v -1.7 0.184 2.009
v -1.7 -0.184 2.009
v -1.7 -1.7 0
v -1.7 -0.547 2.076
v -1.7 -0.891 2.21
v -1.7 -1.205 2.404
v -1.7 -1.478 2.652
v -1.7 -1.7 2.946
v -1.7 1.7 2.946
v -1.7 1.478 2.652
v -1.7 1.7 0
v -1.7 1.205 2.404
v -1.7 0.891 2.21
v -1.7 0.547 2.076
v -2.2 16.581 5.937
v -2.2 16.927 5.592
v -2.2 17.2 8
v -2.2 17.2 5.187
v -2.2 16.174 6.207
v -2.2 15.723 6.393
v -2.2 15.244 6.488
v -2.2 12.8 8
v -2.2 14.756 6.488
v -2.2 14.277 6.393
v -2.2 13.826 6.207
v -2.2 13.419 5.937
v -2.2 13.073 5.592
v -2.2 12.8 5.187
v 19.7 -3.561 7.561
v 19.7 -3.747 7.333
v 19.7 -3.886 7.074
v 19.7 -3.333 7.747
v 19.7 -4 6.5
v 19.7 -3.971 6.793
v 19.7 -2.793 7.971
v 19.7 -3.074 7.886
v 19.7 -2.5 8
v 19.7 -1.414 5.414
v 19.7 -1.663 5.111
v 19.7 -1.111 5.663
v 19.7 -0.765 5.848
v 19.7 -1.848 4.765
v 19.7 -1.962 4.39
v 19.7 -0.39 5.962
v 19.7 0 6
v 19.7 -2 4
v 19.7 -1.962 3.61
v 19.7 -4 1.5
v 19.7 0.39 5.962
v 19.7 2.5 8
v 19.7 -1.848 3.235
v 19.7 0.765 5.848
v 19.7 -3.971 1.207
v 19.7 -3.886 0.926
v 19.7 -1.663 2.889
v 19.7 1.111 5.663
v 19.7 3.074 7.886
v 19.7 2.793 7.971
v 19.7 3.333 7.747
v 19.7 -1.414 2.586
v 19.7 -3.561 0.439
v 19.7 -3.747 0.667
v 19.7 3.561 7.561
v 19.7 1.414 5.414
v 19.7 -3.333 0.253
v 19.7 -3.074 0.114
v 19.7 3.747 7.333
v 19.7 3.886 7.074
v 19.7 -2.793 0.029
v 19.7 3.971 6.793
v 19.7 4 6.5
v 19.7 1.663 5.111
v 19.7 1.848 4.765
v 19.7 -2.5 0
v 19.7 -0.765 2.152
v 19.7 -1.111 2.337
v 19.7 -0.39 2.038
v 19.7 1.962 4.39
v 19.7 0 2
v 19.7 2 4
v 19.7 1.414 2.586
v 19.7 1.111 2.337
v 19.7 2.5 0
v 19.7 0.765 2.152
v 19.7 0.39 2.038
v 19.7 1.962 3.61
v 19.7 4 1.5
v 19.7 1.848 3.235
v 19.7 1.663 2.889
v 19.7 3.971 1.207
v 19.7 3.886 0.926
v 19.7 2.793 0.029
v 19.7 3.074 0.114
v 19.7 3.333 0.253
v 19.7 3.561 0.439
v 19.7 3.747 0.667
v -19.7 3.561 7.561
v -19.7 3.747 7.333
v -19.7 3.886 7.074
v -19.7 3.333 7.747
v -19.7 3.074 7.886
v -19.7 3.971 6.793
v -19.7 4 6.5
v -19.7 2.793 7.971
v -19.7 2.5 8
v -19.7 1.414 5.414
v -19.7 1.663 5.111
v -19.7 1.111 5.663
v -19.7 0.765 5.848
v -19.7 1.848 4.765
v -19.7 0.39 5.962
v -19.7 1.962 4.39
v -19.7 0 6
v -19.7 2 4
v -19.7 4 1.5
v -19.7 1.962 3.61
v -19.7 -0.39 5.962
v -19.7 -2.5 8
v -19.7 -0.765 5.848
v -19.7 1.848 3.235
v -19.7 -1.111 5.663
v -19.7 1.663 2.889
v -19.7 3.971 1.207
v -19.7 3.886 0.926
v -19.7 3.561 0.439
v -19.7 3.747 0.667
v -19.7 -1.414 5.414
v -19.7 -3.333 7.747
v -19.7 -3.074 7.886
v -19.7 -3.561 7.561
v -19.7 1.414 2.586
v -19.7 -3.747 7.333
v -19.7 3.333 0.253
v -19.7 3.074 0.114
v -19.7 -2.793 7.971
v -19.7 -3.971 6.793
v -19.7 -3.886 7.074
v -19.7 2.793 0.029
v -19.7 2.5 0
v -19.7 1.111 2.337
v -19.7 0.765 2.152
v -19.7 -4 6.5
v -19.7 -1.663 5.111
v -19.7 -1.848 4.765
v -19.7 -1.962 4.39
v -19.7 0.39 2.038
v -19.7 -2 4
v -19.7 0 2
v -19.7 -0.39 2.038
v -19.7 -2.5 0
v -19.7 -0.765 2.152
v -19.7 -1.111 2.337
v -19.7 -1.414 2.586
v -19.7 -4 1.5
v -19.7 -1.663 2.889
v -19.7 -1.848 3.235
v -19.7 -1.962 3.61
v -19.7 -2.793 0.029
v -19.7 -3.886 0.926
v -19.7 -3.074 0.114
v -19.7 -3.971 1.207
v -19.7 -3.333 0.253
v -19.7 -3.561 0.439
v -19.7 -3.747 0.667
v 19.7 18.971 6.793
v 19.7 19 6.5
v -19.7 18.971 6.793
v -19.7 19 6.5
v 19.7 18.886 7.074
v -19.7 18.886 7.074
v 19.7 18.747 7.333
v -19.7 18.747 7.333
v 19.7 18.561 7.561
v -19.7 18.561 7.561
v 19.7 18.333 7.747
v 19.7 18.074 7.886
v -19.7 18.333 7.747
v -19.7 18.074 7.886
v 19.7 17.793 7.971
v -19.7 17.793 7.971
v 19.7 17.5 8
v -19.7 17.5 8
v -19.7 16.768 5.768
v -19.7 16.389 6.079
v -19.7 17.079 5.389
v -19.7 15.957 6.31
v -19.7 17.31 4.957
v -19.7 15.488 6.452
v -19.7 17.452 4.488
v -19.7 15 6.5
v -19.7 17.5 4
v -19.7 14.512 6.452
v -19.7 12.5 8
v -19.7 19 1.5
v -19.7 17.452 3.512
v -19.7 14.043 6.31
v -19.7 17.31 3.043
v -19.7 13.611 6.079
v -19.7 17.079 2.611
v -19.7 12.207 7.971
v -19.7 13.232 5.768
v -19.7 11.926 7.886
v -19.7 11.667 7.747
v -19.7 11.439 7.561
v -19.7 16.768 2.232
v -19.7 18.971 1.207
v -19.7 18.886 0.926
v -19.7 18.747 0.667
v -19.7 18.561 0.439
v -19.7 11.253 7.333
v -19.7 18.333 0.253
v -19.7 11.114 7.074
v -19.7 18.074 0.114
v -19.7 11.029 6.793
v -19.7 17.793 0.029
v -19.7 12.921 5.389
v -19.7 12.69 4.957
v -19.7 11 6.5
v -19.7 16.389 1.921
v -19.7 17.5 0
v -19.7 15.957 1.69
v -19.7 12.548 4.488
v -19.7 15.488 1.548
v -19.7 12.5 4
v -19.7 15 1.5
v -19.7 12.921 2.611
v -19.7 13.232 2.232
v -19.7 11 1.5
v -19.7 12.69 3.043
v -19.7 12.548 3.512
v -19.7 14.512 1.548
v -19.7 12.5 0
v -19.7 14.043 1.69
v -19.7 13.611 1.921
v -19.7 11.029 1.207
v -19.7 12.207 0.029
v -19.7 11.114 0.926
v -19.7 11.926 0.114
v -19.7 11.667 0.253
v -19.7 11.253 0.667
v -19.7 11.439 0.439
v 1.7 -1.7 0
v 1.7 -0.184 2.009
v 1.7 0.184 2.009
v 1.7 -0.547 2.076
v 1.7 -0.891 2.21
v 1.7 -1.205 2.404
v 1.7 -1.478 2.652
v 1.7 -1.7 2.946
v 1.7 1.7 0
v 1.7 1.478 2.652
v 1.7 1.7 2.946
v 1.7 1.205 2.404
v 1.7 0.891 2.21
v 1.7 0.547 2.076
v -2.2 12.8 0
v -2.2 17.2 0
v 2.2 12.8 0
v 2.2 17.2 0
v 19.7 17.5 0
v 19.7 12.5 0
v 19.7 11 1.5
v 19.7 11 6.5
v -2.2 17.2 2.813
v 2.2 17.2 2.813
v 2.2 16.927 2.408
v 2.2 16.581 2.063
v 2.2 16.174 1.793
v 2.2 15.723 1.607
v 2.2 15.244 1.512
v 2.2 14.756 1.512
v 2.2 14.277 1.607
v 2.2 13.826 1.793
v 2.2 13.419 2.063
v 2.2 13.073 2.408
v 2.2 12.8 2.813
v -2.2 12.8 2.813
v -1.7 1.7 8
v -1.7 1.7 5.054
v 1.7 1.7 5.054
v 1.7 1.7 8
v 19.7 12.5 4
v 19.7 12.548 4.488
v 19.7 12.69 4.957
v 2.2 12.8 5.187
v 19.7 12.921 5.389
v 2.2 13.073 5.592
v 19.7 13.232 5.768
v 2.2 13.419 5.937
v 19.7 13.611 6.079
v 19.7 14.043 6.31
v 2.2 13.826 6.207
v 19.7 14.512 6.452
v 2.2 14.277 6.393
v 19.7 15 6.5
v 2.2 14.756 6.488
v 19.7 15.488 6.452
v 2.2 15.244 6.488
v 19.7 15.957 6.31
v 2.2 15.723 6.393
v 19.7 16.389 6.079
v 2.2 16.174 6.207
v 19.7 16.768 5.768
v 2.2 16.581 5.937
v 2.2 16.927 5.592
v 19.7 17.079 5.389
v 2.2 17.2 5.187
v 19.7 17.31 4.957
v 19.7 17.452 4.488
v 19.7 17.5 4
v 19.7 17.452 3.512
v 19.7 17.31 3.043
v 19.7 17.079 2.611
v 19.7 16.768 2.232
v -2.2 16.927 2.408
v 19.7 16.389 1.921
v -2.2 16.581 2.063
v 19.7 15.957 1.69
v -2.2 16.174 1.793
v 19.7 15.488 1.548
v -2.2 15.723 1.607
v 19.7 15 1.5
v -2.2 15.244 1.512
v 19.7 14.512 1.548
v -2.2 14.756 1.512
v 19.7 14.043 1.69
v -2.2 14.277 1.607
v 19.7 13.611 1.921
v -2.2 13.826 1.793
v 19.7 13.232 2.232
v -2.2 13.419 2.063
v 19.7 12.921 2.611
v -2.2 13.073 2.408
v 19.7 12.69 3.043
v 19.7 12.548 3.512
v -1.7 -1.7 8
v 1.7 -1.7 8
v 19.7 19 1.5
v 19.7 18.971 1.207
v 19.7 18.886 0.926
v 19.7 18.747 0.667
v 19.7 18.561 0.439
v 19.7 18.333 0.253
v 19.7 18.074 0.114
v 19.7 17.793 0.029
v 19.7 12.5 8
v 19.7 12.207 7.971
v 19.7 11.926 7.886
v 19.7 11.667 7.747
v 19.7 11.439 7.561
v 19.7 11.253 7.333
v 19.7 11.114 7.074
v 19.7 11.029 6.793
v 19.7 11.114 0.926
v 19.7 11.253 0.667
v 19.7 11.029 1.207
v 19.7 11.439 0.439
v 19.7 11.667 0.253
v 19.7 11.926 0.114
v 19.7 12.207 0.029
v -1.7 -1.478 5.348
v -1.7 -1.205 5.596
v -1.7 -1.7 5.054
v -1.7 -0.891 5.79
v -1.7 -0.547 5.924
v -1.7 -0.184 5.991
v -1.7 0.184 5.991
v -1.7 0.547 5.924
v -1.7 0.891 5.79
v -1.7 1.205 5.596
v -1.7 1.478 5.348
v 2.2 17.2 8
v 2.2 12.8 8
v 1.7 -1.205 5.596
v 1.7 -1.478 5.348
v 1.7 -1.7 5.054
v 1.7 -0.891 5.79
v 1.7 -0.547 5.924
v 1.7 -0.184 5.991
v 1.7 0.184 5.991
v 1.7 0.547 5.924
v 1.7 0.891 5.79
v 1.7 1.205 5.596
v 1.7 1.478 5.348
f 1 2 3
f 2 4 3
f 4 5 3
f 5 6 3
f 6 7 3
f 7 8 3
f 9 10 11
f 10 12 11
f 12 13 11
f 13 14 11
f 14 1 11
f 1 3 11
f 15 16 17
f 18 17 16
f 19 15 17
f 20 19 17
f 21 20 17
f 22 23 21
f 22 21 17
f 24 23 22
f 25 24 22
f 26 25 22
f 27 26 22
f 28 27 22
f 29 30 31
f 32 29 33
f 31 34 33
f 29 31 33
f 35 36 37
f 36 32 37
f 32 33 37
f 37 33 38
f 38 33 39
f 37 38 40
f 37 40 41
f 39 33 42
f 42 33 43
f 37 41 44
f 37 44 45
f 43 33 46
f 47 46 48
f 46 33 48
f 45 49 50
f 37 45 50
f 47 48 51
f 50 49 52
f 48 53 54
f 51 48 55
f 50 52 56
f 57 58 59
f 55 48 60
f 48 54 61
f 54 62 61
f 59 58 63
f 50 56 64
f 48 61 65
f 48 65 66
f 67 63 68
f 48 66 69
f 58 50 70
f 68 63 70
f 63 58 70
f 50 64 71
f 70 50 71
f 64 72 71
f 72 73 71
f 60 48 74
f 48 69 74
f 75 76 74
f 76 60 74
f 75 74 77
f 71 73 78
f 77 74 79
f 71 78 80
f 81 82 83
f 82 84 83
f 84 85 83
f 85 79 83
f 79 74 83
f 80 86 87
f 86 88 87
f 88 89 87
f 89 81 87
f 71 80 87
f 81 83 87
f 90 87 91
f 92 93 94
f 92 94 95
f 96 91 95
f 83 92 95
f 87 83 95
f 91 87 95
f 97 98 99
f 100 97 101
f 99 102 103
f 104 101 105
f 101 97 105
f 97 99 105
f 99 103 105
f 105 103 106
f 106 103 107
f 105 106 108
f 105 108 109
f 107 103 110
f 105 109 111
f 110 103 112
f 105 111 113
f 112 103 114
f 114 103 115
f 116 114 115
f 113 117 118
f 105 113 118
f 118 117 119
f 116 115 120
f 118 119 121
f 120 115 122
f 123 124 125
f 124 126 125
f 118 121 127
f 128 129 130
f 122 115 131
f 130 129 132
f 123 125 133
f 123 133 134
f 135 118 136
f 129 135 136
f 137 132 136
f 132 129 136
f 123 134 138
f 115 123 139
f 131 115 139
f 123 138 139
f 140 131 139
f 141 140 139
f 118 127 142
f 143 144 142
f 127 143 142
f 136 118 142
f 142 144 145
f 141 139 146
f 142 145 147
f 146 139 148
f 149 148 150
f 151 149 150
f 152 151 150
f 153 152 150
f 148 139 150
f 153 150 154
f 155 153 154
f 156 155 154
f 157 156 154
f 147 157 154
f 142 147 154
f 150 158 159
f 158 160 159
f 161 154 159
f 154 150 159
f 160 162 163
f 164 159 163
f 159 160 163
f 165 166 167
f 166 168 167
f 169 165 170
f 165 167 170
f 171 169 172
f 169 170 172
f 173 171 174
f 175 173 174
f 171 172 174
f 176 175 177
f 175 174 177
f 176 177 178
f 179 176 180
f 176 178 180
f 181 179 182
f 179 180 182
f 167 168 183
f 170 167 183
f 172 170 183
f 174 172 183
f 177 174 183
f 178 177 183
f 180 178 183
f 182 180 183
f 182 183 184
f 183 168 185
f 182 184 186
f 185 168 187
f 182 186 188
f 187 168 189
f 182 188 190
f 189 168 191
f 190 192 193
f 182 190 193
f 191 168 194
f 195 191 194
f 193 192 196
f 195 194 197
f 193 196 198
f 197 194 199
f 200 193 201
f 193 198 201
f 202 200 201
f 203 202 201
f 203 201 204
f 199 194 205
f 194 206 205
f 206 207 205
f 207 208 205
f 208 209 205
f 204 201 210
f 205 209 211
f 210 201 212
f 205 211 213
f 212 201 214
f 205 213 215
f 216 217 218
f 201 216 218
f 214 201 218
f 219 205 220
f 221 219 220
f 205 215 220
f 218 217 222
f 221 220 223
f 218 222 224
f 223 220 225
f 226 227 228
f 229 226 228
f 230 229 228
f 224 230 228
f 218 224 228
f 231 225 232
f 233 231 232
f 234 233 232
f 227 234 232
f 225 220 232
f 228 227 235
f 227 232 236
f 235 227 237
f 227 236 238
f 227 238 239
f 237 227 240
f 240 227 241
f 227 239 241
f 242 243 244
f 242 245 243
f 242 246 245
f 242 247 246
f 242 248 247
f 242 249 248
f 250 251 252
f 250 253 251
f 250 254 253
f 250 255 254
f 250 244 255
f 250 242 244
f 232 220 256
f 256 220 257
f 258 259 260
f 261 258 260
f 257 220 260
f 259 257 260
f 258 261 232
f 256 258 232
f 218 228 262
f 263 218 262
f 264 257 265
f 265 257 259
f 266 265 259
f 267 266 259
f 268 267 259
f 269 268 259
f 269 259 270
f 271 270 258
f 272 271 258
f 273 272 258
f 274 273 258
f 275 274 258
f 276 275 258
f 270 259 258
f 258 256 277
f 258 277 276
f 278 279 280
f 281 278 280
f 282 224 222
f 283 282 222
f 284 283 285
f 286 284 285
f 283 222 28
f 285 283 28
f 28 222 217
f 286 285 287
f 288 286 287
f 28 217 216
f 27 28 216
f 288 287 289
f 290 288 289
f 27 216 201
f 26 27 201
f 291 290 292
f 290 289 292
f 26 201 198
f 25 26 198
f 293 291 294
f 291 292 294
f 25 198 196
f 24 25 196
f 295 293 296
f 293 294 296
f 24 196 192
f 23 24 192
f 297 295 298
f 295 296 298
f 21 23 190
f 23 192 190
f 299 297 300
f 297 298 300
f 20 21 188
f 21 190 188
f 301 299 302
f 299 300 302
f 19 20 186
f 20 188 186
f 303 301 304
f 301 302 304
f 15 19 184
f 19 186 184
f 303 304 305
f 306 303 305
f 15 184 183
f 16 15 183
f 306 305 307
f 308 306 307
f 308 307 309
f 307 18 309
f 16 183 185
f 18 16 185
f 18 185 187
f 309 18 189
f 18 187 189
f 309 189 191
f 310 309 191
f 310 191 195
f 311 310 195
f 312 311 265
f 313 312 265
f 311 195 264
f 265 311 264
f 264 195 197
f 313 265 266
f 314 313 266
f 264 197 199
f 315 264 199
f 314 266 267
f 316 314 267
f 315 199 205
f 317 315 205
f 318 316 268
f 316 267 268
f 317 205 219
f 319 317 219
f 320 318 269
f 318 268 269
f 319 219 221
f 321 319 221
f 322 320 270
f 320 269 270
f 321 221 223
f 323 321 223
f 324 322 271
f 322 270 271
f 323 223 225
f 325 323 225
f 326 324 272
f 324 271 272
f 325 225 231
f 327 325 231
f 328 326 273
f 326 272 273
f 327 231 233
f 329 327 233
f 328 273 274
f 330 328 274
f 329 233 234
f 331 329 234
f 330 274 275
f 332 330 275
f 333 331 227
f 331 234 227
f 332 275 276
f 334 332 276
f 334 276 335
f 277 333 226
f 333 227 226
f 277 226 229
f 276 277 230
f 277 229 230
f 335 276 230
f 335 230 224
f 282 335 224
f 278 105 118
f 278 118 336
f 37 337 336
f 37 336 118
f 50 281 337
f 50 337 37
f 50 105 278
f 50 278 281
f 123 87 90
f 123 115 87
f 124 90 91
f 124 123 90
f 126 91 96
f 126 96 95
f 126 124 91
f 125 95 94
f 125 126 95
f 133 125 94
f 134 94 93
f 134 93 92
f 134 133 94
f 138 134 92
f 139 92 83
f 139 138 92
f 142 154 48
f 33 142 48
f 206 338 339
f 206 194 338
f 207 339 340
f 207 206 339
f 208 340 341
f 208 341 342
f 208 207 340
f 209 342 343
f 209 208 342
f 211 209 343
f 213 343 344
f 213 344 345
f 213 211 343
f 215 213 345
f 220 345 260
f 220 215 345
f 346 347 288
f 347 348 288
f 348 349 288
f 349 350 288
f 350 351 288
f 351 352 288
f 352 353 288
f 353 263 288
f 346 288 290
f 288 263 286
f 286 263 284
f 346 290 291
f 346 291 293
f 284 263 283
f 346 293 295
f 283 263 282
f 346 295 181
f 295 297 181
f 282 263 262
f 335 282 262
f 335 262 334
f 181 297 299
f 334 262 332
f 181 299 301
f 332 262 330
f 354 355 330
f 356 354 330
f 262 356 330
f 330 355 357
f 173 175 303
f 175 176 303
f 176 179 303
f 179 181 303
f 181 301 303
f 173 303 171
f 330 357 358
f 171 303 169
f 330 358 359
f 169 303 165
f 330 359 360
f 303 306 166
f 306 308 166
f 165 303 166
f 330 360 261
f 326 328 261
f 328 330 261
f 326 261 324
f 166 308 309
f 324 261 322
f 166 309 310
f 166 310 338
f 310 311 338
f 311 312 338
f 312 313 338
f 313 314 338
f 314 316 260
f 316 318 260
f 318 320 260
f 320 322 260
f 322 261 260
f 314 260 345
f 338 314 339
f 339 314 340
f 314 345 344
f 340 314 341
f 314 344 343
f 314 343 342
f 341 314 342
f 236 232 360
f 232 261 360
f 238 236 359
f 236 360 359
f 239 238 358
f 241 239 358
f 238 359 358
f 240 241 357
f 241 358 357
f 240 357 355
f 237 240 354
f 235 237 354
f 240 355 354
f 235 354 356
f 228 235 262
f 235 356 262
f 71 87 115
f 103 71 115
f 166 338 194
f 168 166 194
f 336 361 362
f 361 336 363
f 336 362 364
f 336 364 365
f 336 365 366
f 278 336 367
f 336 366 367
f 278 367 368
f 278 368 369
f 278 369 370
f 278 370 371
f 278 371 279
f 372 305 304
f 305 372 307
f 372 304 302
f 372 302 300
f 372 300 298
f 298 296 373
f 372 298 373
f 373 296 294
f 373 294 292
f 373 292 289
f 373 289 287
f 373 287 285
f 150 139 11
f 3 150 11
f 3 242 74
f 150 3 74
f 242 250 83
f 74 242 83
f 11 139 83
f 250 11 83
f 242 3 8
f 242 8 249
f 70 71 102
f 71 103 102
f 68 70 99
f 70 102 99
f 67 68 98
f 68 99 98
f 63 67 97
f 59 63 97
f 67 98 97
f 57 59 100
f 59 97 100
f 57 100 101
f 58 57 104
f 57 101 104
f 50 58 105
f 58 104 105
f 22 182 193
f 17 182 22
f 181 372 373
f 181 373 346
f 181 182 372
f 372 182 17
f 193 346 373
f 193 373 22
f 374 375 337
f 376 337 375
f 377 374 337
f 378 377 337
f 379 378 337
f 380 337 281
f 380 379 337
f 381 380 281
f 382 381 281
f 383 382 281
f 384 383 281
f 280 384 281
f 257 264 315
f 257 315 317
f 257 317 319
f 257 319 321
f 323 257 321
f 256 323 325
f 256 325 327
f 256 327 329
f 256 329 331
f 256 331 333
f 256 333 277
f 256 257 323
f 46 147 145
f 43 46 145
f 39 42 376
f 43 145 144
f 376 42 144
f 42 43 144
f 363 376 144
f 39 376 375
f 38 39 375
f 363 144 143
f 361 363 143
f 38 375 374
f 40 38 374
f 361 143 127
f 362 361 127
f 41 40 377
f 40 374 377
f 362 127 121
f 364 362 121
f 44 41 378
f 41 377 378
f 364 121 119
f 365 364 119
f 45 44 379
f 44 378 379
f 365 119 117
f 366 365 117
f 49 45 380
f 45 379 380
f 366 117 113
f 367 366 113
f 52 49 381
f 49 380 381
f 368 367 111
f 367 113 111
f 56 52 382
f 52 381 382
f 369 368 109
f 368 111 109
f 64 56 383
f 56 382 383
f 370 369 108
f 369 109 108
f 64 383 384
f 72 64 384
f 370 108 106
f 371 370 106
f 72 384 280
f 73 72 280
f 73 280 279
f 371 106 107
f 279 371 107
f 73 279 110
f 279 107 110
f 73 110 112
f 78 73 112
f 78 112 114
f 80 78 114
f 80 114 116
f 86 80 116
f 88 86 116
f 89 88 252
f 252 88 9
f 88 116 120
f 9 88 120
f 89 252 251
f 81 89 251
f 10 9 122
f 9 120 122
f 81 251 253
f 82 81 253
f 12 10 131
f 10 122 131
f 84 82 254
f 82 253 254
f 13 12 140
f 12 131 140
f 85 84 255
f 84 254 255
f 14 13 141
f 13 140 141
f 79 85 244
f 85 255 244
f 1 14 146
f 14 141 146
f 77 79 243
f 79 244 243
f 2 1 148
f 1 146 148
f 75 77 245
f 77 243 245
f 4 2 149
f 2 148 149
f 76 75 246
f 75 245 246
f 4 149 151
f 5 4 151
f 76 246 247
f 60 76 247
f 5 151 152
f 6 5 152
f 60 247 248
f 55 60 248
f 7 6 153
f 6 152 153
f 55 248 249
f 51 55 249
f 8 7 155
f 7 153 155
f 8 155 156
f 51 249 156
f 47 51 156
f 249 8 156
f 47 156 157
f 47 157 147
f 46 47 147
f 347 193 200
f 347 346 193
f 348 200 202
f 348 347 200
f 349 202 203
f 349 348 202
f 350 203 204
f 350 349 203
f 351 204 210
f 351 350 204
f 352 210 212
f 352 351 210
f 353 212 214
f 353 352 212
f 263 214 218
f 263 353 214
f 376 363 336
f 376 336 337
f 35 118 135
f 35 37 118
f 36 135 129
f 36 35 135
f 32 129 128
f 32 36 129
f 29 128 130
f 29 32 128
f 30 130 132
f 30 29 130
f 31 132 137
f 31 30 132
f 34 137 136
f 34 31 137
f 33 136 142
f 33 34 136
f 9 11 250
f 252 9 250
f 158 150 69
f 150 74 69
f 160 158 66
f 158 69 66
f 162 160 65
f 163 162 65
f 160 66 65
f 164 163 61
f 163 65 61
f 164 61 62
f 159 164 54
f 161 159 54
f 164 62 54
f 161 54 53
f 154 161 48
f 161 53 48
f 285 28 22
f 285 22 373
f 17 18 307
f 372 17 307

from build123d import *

# Parameters (mm, degrees)
F0_W     = 3.4
F0_H     = 3.4
F1_DEPTH = 8
F2_R     = 2
F3_DEPTH = 39.401
F4_R     = 1.5
F6_R     = 2.5
F7_DEPTH = 39.401
F8_W     = 4.4
F8_H     = 4.4
F9_DEPTH = 8.001


with BuildPart() as f1:
    # F0 (on Top) → F1 (new body)
    with BuildSketch(Plane.XY):
        Polygon((19.7, -2), (19.7, 2), (19.7, 4), (-19.7, 4), (-19.7, 2), (-19.7, -2), (-19.7, -4), (19.7, -4), align=None)
        Rectangle(F0_W, F0_H, mode=Mode.SUBTRACT)
    extrude(amount=F1_DEPTH)

    # F2 (on face) → F3 (cut, through all)
    with BuildSketch(Plane(origin=(-19.7, 0, 0), x_dir=(0, -1, 0), z_dir=(-1, 0, 0))):
        with Locations((0, 4)):
            Circle(F2_R)
    extrude(amount=-F3_DEPTH, mode=Mode.SUBTRACT)

    # F4
    f4_edges = [f1.edges().sort_by_distance(p)[0] for p in [
        (0, -4, 8),
        (0, 4, 8),
        (0, -4, 0),
        (0, 4, 0),
    ]]
    fillet(f4_edges, radius=F4_R)


with BuildPart() as f5_1:
    # F5: copy of F1
    add(f1.part.moved(Location((0, 15, 0))))

    # F6 (on face) → F7 (cut, through all)
    with BuildSketch(Plane(origin=(-19.7, 0, 0), x_dir=(0, -1, 0), z_dir=(-1, 0, 0))):
        with Locations((-15, 4)):
            Circle(F6_R)
    extrude(amount=-F7_DEPTH, mode=Mode.SUBTRACT)

    # F8 (on face) → F9 (cut, through all)
    with BuildSketch(Plane(origin=(0, 0, 0), x_dir=(1, 0, 0), z_dir=(0, 0, -1))):
        with Locations((0, -15)):
            Rectangle(F8_W, F8_H)
    extrude(amount=-F9_DEPTH, mode=Mode.SUBTRACT)


solid = Compound([f1.part, f5_1.part])
